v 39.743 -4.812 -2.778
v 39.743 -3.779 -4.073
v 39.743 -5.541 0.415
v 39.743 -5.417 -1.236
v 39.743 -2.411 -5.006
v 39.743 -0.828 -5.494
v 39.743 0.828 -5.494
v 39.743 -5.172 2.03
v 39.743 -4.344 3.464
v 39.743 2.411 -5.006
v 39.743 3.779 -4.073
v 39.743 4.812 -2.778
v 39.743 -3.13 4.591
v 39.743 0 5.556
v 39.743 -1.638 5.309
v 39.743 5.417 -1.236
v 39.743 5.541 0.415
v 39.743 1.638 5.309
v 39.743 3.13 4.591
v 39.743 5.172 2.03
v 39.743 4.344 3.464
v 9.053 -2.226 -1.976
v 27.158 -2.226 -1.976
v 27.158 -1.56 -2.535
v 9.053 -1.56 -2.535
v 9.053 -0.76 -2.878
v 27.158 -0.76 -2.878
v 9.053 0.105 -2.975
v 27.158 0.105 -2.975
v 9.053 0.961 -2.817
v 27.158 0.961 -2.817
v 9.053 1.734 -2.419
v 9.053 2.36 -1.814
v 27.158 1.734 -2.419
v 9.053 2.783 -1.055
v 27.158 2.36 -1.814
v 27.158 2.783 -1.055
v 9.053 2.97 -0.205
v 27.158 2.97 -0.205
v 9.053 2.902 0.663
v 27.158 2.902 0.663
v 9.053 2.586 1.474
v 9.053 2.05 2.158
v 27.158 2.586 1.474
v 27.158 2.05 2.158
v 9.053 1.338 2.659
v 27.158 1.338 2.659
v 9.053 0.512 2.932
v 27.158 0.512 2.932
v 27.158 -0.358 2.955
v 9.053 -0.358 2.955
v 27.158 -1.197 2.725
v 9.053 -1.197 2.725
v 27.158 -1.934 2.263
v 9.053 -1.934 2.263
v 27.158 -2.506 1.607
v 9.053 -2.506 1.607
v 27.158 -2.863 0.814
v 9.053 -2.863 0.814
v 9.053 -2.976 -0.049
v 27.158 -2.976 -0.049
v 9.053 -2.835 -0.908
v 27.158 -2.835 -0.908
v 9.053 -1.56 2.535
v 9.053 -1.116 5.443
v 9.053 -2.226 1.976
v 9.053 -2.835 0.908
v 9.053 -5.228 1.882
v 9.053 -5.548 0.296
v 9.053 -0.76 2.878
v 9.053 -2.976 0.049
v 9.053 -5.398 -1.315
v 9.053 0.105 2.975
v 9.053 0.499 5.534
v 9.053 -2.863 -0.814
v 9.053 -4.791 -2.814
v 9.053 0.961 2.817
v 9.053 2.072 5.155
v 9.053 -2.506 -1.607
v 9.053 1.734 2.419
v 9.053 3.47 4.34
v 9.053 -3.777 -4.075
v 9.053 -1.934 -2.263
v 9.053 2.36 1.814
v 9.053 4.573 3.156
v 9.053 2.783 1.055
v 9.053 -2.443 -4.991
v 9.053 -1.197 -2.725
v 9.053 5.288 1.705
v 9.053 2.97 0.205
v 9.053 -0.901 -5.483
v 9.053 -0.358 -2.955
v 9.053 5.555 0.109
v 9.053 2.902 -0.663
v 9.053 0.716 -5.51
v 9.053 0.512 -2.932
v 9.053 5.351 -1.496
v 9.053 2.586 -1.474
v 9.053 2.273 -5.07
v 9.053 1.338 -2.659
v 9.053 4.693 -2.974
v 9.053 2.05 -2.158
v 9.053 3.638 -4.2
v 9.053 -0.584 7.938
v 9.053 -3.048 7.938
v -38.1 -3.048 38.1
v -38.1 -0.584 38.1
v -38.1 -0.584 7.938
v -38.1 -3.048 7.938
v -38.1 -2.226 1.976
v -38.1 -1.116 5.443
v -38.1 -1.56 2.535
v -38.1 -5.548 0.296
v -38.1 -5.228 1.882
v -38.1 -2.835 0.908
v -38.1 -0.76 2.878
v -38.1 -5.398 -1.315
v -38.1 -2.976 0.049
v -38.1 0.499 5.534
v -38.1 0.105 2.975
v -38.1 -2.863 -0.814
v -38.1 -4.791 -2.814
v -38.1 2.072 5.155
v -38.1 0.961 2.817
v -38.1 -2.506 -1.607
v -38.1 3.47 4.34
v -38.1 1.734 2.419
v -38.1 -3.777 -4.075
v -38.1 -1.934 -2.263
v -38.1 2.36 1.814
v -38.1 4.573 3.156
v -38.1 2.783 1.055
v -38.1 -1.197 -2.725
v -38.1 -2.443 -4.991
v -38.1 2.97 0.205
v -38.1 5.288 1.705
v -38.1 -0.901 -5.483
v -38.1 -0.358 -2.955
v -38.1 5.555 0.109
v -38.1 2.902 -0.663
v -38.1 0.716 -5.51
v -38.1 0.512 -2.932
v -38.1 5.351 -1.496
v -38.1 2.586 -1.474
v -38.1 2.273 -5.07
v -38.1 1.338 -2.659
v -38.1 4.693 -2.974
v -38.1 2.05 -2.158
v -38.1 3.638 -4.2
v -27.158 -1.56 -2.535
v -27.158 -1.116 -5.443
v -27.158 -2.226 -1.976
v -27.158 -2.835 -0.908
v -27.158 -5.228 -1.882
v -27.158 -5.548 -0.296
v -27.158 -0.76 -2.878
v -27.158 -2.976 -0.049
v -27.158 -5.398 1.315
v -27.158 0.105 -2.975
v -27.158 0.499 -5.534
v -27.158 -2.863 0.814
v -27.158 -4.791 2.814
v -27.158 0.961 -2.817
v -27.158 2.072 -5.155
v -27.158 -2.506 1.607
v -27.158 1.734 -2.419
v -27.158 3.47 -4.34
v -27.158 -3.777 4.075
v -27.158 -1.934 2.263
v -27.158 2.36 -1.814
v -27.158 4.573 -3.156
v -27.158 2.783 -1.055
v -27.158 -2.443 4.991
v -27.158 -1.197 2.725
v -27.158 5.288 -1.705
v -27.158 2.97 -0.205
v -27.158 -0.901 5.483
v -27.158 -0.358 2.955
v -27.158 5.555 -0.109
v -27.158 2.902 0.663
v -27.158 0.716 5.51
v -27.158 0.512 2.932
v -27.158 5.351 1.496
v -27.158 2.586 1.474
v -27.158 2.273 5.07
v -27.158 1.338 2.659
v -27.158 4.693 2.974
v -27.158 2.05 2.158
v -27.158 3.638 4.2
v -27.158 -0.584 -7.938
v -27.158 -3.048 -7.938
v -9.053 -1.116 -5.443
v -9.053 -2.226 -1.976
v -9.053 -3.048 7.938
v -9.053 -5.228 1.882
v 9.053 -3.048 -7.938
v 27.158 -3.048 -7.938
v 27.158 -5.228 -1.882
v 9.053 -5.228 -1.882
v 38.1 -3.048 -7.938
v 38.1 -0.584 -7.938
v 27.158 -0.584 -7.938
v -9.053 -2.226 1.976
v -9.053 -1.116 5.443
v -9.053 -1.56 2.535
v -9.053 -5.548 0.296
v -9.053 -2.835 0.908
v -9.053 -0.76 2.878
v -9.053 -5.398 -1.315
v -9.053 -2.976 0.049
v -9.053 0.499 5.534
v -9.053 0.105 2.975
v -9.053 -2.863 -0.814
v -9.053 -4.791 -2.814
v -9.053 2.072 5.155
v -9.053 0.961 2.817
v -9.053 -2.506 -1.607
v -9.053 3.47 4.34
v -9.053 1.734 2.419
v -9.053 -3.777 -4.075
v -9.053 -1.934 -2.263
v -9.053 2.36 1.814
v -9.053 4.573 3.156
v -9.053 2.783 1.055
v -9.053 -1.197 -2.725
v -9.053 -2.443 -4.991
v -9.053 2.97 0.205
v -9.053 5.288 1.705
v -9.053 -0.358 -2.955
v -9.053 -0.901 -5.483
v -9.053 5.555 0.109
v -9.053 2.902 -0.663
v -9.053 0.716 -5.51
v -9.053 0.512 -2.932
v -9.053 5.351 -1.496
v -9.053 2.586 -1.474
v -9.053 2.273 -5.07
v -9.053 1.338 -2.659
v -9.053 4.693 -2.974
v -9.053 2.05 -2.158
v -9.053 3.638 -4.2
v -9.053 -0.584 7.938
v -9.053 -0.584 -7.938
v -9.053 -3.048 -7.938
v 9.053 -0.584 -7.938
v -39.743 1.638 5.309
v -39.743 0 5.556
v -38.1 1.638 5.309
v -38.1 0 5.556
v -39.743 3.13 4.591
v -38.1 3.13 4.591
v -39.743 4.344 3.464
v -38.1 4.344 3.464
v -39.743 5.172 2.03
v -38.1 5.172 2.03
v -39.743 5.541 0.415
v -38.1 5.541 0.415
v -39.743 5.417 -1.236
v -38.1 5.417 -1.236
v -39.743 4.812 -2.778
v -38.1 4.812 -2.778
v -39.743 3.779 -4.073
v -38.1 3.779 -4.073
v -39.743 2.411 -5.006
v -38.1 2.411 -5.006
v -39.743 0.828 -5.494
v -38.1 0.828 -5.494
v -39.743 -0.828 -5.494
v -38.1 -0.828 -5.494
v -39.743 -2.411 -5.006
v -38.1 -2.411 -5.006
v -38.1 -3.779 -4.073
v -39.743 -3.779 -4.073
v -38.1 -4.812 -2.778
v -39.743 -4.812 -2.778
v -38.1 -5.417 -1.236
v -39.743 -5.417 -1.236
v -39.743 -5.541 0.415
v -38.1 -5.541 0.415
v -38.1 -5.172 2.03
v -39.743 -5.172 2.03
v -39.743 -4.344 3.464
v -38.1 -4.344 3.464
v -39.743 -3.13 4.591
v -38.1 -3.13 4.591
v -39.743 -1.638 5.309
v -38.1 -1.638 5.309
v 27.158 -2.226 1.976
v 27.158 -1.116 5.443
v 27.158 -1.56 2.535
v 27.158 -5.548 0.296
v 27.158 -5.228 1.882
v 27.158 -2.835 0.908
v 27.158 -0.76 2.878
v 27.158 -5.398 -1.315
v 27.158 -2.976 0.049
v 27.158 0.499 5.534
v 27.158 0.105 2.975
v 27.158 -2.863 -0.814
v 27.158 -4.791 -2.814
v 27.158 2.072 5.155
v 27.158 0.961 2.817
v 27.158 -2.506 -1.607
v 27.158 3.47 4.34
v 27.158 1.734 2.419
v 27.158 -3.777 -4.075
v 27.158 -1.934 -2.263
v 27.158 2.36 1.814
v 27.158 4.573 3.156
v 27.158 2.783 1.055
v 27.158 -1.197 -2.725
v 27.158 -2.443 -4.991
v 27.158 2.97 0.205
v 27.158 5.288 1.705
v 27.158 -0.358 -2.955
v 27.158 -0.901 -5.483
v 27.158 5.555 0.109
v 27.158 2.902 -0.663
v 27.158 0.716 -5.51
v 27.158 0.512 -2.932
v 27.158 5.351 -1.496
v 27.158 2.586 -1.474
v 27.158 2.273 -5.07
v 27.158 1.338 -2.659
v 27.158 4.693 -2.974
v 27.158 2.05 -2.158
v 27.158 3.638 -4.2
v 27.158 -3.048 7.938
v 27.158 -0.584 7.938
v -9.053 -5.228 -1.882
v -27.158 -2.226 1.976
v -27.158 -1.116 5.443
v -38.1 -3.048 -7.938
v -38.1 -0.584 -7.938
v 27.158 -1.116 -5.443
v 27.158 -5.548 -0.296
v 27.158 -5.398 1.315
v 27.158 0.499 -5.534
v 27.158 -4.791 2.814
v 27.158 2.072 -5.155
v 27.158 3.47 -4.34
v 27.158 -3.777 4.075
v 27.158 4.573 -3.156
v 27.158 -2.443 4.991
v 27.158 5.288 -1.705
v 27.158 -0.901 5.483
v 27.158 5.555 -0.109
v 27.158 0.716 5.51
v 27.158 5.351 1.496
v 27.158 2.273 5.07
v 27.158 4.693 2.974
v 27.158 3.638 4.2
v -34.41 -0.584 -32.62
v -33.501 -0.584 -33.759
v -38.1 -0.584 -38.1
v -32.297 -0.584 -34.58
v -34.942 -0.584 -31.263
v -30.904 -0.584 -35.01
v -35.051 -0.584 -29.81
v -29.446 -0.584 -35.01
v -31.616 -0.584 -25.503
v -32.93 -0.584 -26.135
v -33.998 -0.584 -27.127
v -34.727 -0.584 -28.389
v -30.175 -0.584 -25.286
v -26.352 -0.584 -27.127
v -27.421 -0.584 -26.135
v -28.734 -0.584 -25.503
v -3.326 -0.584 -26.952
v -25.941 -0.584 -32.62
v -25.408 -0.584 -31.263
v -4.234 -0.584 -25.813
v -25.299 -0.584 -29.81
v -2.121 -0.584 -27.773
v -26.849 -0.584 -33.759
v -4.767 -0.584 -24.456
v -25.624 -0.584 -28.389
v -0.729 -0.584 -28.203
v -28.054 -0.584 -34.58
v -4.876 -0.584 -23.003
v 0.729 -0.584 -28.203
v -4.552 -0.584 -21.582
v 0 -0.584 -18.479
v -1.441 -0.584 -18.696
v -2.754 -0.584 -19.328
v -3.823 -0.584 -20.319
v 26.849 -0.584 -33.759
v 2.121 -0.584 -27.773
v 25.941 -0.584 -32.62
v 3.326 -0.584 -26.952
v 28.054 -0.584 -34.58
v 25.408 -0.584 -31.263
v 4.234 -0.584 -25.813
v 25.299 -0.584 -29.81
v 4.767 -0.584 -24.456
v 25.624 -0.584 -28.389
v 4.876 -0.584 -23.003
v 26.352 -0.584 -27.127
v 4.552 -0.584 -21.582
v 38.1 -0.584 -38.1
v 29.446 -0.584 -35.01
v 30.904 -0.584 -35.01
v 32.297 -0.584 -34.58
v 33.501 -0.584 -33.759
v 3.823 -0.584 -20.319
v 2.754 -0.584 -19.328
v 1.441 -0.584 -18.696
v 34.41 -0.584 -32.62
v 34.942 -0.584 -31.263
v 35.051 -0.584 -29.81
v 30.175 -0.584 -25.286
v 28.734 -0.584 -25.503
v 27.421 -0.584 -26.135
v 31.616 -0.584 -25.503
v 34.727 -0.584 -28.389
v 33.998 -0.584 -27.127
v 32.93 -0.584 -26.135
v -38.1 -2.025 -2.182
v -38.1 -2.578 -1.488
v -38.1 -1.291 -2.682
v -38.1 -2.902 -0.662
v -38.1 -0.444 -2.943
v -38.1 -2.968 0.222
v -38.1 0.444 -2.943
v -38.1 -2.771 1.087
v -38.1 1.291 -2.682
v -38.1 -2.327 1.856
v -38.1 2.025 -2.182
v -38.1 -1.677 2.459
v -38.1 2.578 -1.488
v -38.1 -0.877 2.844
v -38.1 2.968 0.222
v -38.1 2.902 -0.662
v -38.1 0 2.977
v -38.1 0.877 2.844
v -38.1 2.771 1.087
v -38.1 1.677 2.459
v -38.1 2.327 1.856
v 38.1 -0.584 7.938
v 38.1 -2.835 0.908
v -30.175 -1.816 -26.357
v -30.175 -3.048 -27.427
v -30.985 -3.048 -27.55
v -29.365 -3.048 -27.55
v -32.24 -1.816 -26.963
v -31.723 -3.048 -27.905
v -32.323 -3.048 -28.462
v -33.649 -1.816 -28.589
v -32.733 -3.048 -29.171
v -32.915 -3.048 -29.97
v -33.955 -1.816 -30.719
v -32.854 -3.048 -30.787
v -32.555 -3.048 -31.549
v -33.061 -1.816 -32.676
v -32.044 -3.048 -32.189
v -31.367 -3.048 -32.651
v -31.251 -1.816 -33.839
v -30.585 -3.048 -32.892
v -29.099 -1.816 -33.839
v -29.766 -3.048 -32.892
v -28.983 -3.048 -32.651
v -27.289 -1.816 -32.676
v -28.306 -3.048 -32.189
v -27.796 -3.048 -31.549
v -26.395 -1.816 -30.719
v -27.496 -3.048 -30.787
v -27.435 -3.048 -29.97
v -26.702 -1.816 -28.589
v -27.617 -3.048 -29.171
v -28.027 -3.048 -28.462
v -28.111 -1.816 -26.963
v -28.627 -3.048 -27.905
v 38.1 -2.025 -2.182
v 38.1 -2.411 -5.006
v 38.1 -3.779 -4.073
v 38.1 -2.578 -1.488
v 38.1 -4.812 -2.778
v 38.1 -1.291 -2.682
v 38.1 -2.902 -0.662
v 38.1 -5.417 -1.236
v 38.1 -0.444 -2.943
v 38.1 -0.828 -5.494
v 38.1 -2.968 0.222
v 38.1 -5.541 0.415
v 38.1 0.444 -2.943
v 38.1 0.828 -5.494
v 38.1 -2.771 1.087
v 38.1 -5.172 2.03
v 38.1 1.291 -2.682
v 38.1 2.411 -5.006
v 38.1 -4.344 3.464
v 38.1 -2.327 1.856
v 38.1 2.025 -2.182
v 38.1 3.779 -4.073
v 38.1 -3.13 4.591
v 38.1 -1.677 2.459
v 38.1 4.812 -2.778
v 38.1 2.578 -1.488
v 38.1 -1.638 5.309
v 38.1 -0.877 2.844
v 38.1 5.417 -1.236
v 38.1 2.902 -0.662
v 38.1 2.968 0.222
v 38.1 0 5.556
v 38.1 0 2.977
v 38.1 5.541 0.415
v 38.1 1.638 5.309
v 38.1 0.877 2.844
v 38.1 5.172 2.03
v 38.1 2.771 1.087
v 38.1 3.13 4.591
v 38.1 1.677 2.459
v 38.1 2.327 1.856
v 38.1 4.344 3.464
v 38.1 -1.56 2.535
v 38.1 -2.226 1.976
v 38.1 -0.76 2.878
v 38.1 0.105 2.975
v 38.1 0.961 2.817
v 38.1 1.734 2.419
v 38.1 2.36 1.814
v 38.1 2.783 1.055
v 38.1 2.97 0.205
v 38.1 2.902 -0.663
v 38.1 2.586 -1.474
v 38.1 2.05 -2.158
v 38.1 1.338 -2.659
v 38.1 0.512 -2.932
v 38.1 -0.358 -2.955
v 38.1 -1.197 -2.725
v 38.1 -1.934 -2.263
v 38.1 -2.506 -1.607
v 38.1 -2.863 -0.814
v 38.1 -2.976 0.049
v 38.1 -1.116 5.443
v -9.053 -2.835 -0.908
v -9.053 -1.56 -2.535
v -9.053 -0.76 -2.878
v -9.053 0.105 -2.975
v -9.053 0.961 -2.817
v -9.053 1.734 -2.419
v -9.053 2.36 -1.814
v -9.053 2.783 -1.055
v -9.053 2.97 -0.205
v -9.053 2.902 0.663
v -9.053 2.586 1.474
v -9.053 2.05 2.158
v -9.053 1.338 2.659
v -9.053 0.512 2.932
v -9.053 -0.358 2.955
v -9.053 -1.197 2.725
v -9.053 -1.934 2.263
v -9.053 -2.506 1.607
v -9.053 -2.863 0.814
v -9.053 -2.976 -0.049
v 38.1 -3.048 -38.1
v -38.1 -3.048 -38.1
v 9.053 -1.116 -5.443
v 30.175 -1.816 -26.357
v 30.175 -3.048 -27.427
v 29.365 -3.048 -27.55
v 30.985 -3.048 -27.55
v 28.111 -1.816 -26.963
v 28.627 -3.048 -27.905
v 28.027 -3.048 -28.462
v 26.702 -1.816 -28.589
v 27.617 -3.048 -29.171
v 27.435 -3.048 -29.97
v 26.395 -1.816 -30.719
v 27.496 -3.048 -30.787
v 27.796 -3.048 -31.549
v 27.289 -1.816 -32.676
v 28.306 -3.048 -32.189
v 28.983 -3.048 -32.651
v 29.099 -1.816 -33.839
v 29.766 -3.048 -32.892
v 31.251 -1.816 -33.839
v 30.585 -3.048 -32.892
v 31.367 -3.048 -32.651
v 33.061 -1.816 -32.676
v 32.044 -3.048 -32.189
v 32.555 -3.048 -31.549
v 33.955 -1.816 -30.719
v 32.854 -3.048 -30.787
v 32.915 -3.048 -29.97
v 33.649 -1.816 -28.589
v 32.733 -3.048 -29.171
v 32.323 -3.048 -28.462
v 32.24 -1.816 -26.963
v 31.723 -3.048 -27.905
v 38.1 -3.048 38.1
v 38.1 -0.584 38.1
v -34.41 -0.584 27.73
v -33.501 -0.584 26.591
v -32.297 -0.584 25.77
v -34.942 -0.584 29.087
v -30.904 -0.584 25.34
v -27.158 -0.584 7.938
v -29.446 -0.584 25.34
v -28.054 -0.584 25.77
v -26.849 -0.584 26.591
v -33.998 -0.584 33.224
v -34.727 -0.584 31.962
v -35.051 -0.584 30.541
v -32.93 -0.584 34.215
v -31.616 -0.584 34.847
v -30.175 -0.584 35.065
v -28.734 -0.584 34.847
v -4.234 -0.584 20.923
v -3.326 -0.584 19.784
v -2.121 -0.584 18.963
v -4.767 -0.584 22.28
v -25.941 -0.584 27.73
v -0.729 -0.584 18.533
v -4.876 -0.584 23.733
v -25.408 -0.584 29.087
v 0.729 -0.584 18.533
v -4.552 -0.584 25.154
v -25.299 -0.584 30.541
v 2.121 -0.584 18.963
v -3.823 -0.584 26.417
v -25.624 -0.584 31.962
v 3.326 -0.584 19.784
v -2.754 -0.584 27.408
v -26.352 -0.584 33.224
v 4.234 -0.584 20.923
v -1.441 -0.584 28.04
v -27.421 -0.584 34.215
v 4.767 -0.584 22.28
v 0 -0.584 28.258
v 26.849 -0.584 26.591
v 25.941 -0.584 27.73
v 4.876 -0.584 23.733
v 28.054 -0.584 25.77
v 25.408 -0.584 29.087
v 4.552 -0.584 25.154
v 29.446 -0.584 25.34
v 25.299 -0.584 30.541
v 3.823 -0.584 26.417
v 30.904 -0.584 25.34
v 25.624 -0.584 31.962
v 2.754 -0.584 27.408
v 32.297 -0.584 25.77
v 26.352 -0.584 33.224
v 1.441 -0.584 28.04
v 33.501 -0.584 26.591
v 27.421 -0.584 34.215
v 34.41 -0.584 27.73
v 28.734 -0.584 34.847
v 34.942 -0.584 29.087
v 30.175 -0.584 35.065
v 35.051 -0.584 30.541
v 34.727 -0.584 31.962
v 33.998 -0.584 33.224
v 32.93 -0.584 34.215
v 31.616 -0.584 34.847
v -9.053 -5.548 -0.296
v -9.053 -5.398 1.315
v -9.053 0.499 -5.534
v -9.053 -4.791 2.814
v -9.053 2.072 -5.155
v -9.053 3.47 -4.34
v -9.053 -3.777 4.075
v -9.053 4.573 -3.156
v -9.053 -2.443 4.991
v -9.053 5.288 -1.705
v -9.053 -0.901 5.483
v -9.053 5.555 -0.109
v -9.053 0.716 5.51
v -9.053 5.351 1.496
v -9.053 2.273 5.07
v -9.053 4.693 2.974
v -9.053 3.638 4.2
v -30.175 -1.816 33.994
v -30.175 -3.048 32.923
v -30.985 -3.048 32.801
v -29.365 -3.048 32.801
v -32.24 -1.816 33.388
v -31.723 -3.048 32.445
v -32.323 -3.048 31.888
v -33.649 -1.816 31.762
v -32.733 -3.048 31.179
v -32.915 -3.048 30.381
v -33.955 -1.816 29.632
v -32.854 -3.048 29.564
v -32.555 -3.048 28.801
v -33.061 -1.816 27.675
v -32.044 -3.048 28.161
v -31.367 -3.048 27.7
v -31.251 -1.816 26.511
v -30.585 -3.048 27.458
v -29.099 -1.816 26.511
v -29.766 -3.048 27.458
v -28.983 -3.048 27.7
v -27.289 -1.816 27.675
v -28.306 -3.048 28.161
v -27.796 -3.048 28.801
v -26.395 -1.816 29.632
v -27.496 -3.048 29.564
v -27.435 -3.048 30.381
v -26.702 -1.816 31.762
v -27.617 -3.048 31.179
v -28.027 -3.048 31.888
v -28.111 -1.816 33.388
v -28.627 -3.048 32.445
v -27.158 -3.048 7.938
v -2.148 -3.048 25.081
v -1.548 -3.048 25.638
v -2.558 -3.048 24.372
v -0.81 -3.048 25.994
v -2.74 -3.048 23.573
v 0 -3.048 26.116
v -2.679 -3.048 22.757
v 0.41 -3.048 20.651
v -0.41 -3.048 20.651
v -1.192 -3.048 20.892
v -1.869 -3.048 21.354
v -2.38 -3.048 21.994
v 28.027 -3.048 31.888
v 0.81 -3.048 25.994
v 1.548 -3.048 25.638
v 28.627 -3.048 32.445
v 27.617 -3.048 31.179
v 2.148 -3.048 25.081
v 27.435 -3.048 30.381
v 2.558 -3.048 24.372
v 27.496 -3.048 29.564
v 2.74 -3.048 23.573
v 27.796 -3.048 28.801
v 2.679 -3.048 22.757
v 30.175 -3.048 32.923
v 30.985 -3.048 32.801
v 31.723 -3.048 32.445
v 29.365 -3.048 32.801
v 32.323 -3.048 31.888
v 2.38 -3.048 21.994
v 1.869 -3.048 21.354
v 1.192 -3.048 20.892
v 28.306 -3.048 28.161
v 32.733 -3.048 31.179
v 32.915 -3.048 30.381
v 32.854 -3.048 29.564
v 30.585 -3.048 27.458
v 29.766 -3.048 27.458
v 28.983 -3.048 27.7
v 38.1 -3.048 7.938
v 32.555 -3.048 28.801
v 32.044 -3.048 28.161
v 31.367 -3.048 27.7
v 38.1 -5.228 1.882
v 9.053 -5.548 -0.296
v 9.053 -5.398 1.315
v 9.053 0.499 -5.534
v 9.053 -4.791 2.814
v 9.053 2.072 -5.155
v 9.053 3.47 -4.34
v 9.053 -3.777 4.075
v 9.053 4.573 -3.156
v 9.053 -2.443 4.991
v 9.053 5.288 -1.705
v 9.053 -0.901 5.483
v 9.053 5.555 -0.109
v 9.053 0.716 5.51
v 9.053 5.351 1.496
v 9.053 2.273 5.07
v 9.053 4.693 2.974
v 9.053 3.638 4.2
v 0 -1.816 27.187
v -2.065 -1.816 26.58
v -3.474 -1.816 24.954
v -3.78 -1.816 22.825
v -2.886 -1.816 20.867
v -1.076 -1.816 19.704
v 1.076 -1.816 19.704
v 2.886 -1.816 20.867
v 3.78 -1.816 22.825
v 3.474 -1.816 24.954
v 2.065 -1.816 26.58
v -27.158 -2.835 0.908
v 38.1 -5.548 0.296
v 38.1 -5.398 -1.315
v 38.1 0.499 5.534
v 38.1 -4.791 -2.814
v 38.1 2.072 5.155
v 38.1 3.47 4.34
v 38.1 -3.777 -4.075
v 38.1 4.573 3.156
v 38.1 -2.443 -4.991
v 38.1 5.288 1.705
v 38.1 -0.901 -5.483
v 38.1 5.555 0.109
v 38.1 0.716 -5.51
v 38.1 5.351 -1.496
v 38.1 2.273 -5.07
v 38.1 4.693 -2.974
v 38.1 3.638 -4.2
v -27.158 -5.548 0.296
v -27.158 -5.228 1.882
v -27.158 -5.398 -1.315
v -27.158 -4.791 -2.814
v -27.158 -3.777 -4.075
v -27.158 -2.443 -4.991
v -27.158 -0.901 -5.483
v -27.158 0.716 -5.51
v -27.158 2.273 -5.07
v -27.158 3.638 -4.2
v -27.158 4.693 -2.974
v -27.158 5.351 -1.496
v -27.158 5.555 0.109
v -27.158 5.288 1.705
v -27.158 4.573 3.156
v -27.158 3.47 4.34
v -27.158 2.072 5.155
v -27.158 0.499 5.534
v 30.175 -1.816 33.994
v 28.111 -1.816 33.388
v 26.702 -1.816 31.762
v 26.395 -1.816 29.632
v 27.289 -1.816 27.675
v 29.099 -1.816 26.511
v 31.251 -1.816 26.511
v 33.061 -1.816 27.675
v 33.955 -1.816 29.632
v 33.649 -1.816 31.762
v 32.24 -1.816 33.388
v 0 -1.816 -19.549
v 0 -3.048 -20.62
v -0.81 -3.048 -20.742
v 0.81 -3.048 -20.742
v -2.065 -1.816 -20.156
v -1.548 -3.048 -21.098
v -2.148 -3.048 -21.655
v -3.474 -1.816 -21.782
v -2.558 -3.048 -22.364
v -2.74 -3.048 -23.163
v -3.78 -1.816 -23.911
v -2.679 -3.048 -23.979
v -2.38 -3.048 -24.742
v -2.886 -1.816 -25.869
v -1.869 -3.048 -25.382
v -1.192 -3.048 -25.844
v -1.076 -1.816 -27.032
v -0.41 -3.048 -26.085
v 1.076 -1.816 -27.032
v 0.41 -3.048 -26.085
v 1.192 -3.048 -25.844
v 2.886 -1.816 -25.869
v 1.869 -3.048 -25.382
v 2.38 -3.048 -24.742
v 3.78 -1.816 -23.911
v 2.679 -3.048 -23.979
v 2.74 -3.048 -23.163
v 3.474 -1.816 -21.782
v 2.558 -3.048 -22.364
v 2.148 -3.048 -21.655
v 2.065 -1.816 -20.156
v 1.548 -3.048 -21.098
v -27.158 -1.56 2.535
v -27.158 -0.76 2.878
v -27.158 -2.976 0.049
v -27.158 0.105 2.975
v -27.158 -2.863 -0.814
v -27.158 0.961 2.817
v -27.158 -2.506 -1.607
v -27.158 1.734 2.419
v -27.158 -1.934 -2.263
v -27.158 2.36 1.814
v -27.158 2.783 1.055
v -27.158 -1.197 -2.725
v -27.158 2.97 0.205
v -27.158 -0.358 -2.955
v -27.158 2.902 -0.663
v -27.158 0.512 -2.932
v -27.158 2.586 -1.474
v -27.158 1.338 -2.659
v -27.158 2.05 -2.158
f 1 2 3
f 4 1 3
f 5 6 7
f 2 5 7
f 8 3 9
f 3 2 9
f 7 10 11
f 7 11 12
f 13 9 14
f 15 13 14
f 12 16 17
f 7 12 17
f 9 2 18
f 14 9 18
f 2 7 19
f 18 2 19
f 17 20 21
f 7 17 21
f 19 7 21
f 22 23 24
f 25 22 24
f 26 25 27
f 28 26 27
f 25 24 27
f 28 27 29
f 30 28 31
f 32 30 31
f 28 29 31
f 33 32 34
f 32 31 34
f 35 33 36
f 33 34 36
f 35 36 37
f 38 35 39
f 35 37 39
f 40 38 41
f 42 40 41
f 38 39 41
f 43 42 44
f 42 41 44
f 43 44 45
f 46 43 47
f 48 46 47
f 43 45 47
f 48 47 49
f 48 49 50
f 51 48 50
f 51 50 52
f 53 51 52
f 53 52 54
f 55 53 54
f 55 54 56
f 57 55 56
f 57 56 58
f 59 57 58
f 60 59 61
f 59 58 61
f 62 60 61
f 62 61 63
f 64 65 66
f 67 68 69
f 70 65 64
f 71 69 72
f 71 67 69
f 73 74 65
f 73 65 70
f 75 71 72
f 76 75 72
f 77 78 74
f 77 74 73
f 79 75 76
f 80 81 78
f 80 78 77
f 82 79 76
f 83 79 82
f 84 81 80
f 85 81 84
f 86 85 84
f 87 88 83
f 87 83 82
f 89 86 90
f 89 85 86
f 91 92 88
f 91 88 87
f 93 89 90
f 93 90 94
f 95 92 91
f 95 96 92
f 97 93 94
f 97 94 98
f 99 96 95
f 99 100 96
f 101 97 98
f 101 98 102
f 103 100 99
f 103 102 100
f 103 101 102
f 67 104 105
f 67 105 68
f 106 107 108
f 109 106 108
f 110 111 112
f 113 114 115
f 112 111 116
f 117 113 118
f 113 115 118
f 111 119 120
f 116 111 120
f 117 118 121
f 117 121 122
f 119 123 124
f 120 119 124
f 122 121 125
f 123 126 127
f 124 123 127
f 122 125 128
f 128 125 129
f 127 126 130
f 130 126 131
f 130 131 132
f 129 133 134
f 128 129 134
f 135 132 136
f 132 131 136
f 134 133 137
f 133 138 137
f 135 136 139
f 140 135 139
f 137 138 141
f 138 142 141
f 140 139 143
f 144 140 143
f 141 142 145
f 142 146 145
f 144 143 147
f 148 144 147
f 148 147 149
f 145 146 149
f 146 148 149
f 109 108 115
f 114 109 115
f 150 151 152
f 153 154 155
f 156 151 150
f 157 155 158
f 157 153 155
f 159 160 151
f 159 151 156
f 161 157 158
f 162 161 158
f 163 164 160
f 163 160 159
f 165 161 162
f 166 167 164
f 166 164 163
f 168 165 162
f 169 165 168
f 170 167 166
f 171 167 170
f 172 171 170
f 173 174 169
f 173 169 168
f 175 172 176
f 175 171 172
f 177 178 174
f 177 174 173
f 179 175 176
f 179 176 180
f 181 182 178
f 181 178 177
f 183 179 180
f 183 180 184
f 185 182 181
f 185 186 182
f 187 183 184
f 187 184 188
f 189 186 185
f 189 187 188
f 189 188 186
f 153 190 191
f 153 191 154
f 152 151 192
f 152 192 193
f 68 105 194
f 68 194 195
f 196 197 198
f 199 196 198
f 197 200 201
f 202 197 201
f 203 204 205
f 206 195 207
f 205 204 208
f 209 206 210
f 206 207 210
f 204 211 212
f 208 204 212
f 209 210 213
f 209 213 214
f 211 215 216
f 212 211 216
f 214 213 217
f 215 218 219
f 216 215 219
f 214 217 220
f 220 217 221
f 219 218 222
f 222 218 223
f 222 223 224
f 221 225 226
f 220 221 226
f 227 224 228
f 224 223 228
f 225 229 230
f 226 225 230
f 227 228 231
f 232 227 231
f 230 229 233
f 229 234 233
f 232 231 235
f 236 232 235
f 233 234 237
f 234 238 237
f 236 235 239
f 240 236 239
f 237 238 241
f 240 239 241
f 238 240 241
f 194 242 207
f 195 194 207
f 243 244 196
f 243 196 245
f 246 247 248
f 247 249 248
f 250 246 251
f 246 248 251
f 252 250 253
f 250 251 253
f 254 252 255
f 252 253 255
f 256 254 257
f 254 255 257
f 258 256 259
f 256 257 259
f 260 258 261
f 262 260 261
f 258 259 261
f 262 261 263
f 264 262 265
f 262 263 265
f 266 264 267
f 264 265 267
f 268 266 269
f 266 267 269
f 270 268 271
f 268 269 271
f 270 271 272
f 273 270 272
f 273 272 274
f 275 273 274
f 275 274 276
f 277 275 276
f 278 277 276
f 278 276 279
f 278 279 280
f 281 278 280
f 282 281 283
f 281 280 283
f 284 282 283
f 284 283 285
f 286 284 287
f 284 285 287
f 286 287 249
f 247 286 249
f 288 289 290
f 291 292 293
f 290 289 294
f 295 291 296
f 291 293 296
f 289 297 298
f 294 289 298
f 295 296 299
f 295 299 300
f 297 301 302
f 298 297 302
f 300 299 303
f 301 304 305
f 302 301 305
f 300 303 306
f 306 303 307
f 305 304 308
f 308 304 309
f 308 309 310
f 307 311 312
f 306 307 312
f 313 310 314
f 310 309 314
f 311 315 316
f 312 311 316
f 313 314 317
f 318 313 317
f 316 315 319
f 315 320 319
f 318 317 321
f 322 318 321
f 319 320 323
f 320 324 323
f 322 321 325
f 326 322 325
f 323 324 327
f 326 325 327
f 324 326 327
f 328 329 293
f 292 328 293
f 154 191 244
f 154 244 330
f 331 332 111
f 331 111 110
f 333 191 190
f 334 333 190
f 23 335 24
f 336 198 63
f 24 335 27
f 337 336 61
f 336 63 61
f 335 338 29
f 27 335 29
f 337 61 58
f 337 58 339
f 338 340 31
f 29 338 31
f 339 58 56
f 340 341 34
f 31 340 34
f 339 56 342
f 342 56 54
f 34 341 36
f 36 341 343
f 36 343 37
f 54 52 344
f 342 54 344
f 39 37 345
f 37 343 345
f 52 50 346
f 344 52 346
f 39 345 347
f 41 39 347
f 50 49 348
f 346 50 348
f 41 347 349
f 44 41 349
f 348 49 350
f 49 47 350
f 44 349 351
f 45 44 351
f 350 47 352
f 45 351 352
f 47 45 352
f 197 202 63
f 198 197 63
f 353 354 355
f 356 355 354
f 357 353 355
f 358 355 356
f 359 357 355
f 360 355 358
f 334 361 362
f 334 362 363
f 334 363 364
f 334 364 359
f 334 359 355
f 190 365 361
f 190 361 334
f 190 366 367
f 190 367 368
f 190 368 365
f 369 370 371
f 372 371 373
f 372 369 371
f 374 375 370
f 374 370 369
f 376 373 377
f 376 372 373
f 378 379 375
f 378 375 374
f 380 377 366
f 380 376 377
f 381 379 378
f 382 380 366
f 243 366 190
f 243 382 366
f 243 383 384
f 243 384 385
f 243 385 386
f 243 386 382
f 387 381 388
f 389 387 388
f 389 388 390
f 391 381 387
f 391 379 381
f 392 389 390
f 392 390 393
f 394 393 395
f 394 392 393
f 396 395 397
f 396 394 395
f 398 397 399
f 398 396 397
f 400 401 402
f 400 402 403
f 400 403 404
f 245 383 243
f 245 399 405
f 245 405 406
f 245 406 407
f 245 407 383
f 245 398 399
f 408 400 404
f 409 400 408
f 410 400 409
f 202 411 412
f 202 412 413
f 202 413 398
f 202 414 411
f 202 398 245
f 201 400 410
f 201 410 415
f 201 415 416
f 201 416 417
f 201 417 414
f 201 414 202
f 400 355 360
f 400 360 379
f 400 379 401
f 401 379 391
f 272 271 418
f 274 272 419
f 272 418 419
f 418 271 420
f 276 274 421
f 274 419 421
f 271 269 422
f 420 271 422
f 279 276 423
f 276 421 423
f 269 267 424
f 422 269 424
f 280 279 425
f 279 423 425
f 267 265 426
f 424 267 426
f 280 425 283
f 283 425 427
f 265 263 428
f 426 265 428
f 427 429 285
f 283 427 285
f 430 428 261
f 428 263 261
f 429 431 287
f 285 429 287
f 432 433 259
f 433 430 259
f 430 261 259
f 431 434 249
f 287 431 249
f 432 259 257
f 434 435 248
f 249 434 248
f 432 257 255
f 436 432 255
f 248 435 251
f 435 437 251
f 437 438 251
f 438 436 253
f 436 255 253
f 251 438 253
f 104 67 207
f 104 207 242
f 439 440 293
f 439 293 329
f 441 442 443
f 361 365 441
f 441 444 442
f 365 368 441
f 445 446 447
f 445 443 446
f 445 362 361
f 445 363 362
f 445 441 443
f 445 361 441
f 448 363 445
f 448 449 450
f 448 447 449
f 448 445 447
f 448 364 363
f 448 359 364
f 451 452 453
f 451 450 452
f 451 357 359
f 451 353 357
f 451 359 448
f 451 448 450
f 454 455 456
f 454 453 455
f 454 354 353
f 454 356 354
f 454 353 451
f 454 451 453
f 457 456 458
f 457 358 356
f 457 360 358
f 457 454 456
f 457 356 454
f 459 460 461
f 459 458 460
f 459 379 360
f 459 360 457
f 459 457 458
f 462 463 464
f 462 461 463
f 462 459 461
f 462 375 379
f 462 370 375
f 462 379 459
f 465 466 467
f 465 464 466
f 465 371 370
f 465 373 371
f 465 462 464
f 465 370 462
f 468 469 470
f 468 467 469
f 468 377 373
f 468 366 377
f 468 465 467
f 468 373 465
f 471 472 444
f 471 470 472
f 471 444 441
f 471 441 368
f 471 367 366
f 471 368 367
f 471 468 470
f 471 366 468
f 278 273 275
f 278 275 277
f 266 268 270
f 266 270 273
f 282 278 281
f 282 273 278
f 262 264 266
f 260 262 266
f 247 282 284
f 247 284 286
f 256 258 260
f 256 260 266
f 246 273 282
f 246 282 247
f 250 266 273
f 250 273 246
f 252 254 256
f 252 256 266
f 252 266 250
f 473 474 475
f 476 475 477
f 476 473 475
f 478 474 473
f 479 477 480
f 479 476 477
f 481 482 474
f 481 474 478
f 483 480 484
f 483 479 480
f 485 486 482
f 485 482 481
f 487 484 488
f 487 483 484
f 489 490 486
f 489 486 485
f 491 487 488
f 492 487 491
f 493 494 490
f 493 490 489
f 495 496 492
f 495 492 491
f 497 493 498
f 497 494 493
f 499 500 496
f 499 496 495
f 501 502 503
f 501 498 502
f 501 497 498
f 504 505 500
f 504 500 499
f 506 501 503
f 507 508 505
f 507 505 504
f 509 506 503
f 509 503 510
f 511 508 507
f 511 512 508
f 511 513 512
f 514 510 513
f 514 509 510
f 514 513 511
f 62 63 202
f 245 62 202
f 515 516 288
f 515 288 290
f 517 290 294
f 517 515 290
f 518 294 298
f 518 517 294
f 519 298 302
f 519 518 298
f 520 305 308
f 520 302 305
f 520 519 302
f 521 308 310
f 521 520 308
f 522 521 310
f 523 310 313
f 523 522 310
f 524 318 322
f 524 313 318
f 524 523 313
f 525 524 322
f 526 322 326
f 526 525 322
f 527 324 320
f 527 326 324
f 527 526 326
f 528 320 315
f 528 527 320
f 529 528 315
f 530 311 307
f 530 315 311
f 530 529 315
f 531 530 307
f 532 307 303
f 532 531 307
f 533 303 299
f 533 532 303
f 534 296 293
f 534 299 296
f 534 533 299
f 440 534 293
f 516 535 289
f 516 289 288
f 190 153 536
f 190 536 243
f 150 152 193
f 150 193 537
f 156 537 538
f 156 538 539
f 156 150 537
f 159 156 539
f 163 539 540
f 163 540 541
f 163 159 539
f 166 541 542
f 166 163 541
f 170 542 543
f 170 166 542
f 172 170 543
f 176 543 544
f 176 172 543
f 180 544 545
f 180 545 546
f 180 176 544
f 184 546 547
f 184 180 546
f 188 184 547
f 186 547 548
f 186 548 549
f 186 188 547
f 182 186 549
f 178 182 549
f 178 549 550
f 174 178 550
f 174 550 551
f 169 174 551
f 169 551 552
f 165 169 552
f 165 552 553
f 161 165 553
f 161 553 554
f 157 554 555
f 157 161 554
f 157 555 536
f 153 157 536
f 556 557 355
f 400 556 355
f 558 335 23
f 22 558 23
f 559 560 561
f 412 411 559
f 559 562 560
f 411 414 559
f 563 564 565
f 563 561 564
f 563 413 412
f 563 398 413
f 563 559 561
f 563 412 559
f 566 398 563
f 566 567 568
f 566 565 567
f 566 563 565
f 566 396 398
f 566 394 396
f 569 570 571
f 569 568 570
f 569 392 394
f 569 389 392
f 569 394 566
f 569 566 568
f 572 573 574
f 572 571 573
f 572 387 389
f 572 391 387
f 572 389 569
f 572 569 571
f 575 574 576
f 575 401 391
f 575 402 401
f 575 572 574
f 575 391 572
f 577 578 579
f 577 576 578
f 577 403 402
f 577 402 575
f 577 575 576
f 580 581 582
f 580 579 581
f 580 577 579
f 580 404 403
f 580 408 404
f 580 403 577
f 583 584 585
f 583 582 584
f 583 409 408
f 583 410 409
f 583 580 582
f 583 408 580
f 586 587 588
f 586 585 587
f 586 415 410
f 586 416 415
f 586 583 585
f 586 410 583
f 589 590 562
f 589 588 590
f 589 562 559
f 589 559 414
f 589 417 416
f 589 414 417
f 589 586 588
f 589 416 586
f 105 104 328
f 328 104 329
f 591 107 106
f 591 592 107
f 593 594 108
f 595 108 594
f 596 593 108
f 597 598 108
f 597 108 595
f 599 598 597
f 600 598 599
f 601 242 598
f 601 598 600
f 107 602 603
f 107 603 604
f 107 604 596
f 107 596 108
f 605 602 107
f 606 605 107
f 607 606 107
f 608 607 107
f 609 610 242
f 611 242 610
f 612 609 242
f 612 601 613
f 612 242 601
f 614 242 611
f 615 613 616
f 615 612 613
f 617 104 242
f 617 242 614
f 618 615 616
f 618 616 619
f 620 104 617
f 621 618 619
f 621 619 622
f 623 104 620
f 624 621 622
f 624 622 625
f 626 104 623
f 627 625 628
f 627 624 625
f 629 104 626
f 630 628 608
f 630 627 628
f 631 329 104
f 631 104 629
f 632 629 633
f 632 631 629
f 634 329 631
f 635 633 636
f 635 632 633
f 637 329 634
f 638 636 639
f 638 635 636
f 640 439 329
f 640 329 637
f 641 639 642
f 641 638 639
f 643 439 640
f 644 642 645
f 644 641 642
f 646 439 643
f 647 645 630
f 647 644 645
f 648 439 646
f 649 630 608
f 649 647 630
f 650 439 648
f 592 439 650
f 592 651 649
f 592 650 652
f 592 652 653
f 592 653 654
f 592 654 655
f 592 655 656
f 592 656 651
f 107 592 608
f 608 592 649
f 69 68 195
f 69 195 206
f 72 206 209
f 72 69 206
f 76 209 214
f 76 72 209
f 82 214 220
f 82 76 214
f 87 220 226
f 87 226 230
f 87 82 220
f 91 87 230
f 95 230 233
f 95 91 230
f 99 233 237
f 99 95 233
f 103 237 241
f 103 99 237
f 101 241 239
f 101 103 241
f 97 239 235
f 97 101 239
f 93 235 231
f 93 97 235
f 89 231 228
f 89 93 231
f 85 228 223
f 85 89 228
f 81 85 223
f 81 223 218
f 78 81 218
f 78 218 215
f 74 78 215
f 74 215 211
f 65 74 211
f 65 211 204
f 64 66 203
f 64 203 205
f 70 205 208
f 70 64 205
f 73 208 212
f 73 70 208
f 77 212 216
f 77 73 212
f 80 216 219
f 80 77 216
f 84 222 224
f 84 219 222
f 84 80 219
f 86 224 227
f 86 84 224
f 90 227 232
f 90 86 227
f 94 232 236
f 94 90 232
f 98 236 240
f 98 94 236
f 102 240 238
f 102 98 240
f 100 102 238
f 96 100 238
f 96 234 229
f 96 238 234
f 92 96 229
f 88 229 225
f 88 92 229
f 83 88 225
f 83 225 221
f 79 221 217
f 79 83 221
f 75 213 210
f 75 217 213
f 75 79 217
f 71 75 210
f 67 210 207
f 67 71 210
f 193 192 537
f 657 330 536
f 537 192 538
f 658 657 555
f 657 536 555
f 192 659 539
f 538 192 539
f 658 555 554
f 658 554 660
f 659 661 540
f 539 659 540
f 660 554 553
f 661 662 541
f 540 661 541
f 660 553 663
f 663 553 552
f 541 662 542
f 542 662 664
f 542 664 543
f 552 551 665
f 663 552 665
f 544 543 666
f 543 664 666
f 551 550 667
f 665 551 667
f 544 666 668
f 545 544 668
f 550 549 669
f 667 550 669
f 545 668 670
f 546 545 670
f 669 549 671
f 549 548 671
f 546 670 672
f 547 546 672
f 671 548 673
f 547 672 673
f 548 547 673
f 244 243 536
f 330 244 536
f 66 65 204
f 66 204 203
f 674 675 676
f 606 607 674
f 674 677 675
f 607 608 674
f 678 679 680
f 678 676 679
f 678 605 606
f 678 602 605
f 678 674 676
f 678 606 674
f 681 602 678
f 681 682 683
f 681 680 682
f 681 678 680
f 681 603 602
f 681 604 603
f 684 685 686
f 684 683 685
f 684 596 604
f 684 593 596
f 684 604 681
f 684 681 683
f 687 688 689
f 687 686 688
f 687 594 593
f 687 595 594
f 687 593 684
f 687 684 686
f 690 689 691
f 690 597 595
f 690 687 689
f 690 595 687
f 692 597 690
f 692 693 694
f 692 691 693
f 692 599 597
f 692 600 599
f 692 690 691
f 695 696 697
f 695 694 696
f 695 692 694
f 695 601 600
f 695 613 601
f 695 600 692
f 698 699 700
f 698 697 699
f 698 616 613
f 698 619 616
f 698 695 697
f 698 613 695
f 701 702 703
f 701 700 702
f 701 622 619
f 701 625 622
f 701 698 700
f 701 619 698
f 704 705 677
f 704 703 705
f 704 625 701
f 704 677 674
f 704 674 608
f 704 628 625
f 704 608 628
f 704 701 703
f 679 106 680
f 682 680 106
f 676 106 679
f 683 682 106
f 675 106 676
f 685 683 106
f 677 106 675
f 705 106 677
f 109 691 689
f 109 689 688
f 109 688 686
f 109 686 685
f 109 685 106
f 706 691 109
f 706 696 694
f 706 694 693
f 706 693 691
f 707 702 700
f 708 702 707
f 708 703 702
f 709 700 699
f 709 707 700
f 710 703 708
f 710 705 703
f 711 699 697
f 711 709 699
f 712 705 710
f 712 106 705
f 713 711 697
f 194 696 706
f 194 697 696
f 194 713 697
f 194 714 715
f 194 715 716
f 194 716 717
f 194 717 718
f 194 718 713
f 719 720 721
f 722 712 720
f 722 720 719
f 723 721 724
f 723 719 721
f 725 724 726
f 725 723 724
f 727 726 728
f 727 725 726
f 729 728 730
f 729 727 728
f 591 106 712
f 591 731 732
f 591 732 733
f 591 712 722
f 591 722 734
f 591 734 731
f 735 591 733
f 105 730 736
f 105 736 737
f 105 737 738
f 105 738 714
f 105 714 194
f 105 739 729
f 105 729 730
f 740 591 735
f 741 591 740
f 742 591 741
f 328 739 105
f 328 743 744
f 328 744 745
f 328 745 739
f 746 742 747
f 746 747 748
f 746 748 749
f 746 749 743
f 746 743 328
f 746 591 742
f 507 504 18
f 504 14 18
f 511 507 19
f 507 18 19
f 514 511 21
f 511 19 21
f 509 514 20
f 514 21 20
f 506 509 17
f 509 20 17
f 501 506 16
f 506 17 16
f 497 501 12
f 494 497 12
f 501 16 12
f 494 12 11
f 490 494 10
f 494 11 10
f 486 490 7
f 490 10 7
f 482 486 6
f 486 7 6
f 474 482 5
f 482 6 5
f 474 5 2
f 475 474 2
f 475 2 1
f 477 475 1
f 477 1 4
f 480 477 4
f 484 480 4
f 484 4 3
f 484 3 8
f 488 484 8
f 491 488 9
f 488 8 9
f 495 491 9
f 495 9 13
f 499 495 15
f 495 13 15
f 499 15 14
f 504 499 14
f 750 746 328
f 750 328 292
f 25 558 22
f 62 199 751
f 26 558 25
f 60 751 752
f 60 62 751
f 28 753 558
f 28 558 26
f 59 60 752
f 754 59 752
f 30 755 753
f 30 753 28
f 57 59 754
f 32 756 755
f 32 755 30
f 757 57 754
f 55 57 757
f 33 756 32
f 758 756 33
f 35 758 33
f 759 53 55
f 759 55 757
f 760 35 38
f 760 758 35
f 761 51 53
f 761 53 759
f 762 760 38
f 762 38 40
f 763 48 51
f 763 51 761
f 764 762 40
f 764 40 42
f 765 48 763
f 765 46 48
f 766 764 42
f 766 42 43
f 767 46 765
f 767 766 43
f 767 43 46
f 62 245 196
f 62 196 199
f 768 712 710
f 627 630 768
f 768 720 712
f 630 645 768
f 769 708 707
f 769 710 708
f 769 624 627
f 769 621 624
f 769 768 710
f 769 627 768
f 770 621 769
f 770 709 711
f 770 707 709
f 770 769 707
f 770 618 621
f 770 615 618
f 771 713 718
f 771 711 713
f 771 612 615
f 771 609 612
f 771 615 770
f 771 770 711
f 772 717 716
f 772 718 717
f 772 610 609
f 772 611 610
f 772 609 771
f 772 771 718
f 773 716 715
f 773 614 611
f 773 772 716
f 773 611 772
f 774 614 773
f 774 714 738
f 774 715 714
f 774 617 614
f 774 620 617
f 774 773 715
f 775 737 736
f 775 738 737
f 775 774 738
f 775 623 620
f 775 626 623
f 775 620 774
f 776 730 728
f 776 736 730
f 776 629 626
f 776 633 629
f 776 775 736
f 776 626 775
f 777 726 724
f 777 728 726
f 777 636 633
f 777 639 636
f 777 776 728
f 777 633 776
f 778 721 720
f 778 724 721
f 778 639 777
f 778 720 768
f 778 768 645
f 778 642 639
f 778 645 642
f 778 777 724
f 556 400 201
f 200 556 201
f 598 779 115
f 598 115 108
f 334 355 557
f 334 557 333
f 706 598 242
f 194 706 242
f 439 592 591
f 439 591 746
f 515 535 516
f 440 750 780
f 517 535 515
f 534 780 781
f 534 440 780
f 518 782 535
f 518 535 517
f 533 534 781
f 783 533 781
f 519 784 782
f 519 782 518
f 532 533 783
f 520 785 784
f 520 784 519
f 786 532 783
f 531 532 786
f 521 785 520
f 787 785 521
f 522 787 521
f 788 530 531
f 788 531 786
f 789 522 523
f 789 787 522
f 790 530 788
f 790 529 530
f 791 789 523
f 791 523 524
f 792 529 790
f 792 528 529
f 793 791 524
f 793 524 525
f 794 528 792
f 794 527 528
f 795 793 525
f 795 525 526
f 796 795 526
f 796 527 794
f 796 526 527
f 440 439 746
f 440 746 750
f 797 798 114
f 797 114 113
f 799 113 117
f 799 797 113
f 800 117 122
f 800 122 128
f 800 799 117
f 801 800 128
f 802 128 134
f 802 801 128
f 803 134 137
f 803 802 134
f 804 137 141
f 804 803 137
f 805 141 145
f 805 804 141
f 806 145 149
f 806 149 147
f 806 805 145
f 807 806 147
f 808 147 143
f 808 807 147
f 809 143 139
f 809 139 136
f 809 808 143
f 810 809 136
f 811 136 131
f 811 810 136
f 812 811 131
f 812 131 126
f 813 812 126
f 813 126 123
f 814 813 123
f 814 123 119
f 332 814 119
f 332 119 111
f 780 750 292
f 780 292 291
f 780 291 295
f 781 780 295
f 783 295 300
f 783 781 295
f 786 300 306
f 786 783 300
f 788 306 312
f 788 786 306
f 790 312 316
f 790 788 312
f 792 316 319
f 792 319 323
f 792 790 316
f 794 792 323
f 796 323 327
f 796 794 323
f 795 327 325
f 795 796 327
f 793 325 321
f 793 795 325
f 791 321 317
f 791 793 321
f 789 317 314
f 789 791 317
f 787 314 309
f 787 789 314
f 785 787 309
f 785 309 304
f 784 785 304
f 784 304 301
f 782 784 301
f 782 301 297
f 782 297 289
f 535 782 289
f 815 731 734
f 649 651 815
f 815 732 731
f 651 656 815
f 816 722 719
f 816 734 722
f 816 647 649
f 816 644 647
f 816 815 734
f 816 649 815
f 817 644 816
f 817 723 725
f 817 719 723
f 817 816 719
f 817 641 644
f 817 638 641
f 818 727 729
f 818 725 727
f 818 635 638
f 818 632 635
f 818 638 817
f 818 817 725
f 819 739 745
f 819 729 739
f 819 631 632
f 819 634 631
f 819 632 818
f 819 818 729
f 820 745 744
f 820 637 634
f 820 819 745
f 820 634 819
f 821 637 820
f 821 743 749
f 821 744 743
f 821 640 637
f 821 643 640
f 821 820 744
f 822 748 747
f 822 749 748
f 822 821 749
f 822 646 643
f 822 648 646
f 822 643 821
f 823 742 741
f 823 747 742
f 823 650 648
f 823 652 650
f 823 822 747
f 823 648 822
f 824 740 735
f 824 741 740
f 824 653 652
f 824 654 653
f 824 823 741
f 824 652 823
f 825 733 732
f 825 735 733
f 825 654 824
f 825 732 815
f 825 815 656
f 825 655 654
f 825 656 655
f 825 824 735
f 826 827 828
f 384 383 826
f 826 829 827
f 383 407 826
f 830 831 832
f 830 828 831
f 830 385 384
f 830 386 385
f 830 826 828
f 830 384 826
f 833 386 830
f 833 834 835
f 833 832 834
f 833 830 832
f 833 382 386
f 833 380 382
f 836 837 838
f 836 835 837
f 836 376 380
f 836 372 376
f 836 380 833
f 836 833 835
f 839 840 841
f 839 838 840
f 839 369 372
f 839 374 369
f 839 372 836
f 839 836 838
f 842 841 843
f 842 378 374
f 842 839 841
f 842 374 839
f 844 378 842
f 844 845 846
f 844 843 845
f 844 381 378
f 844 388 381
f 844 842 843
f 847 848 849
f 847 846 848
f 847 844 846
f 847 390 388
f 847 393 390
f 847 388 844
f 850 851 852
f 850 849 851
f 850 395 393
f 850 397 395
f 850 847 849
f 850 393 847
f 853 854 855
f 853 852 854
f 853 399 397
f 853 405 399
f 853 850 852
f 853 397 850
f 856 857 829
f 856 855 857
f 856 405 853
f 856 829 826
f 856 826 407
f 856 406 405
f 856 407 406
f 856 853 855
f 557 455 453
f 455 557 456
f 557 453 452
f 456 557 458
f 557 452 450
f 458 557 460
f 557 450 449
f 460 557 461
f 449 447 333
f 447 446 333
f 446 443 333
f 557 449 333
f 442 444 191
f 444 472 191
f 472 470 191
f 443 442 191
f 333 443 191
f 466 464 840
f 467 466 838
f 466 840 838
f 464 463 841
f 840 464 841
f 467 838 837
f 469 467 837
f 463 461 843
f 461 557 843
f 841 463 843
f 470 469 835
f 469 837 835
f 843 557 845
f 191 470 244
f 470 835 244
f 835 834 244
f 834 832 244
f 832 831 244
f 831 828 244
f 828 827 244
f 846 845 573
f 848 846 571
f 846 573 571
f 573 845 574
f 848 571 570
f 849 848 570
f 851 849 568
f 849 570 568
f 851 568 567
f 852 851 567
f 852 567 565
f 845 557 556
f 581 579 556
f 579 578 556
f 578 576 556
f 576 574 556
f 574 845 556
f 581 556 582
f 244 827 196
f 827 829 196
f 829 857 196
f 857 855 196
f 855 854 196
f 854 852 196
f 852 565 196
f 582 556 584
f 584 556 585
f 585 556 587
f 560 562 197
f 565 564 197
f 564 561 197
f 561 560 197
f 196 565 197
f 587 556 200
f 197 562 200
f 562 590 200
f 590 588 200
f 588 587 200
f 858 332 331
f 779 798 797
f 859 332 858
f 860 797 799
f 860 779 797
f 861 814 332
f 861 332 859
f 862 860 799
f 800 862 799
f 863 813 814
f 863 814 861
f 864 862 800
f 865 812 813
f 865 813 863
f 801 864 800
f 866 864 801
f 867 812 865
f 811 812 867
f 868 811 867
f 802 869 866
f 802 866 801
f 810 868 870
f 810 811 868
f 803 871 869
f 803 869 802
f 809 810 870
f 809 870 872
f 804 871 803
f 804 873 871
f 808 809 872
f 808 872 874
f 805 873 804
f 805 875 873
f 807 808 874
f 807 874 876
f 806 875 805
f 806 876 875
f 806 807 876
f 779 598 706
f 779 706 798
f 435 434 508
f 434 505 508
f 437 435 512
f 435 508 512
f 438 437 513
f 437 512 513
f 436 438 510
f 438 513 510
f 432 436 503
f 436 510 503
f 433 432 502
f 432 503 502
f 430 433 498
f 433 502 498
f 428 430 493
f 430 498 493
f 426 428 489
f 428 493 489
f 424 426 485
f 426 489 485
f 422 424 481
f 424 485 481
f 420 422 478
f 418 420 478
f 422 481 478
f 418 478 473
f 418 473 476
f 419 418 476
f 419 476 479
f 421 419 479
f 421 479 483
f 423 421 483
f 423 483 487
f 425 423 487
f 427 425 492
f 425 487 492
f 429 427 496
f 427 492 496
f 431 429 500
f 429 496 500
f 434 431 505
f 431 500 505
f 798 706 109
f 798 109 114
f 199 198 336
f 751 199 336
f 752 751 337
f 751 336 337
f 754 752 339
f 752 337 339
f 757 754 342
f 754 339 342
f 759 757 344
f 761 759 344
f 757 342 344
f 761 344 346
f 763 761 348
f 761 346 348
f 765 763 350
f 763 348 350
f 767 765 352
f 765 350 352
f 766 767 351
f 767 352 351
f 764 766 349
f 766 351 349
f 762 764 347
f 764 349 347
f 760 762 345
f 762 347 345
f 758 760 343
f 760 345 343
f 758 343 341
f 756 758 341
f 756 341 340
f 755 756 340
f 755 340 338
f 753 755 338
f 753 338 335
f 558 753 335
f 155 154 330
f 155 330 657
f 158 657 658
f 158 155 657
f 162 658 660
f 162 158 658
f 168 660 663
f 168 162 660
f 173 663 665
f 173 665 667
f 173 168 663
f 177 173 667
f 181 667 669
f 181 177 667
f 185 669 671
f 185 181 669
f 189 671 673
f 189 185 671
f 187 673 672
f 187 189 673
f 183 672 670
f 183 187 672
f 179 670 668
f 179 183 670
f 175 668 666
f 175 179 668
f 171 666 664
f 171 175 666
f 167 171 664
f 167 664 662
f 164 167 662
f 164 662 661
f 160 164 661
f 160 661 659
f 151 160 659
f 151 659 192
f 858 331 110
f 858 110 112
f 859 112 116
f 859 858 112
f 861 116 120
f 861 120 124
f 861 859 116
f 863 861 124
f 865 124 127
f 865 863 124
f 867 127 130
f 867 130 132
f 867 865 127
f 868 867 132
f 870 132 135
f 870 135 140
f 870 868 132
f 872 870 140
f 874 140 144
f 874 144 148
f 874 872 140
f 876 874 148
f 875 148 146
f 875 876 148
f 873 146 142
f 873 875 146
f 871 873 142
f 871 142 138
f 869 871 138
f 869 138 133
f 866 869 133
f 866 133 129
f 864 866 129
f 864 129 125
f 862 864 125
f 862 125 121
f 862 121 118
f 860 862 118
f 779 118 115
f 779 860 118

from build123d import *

# Parameters (mm, degrees)
LEFT_LEAF_DEPTH                              = 38.1
SKETCH2_W                                    = 18.10512
SKETCH2_H                                    = 13.49375
CUT_EXTRUDE1_DEPTH                           = 6.55625
CUT_EXTRUDE1_DEPTH_BACK                      = 6.55625
RIGHT_LEAF_DEPTH                             = 18.10512
EXTRUDE3_START                               = -38.1
SKETCH4_W                                    = 30.1625
SKETCH4_H                                    = 2.4638
EXTRUDE3_DEPTH                               = 76.2
SKETCH6_W                                    = 76.2
SKETCH6_H                                    = 2.9765625
SKETCH7_W                                    = 1.642533333
SKETCH7_H                                    = 5.55625
CSK_FOR_10_FLAT_HEAD_MACHINE_SCREW1_AT_COUNT = 2
CSK_FOR_10_FLAT_HEAD_MACHINE_SCREW1_AT_PITCH = 60.3504
CSK_FOR_10_FLAT_HEAD_MACHINE_SCREW1_2_COUNT  = 2
CSK_FOR_10_FLAT_HEAD_MACHINE_SCREW1_2_PITCH  = 85.348354175
CSK_FOR_10_FLAT_HEAD_MACHINE_SCREW1_3_COUNT  = 2
CSK_FOR_10_FLAT_HEAD_MACHINE_SCREW1_3_PITCH  = 60.3504
CSK_FOR_10_FLAT_HEAD_MACHINE_SCREW1_4_COUNT  = 2
CSK_FOR_10_FLAT_HEAD_MACHINE_SCREW1_4_PITCH  = 61.460694442
CSK_FOR_10_FLAT_HEAD_MACHINE_SCREW1_5_COUNT  = 2
CSK_FOR_10_FLAT_HEAD_MACHINE_SCREW1_5_PITCH  = 30.93348779


with BuildPart() as part:
    # Sketch1 → Left Leaf (new body, symmetric)
    with BuildSketch(Plane(origin=(0, 0, 0), x_dir=(0, 0, -1), z_dir=(1, 0, 0))):
        with BuildLine():
            Line((-7.9375, -3.048), (-1.881879584, -5.227852647))
            ThreePointArc((-1.881879584, -5.227852647), (4.20000577, 3.637563139), (-5.442995818, -1.116114057))
            Line((-5.442995818, -1.116114057), (-1.975984457, -2.226074963))
            ThreePointArc((-1.975984457, -2.226074963), (1.473554552, 2.586225299), (-0.907567655, -2.834827202))
            Line((-0.907567655, -2.834827202), (-7.9375, -0.5842))
            Line((-7.9375, -0.5842), (-38.1, -0.5842))
            Line((-38.1, -0.5842), (-38.1, -3.048))
            Line((-38.1, -3.048), (-7.9375, -3.048))
        make_face()
    extrude(amount=LEFT_LEAF_DEPTH, both=True)

    # Sketch2 → Cut-Extrude1 (cut, two sides)
    with BuildSketch(Plane(origin=(0, 0, 0), x_dir=(1, 0, 0), z_dir=(0, 1, 0))) as cut_extrude1_sk:
        with Locations((18.10512, -1.190625)):
            Rectangle(SKETCH2_W, SKETCH2_H)
        with Locations((-18.10512, -1.190625)):
            Rectangle(SKETCH2_W, SKETCH2_H)
    extrude(amount=CUT_EXTRUDE1_DEPTH, mode=Mode.SUBTRACT)
    extrude(cut_extrude1_sk.sketch, amount=-CUT_EXTRUDE1_DEPTH_BACK, mode=Mode.SUBTRACT)

    # Sketch9 → CSK for #10 Flat Head Machine Screw1 (revolve, cut)
    with BuildSketch(Plane(origin=(-30.1752, -0.5842, 30.1752), x_dir=(0, 0, 1), z_dir=(1, 0, 0))):
        Polygon((0, 0), (0, 4.97205), (2.5527, 4.97205), (2.5527, 2.688180894), (4.8895, 0), align=None)
    csk_for_10_flat_head_machine_screw1 = revolve(axis=Axis((-30.1752, 5.7658, 30.1752), (0, -1, 0)), mode=Mode.SUBTRACT)

    # CSK for _10 Flat Head Machine Screw1 3: CSK for #10 Flat Head Machine Screw1 ×2
    with Locations(*[(i * CSK_FOR_10_FLAT_HEAD_MACHINE_SCREW1_3_PITCH, 0, 0) for i in range(1, CSK_FOR_10_FLAT_HEAD_MACHINE_SCREW1_3_COUNT)]):
        add(csk_for_10_flat_head_machine_screw1, mode=Mode.SUBTRACT)

    # CSK for _10 Flat Head Machine Screw1 5: CSK for #10 Flat Head Machine Screw1 ×2
    with Locations(*[Vector(0.975486508, 0, -0.220059246) * (i * CSK_FOR_10_FLAT_HEAD_MACHINE_SCREW1_5_PITCH) for i in range(1, CSK_FOR_10_FLAT_HEAD_MACHINE_SCREW1_5_COUNT)]):
        add(csk_for_10_flat_head_machine_screw1, mode=Mode.SUBTRACT)


with BuildPart() as body_2:
    # Sketch3 → Right Leaf (new body)
    with BuildSketch(Plane(origin=(27.15768, 0, 0), x_dir=(0, 0, -1), z_dir=(1, 0, 0))):
        with BuildLine():
            Line((7.9375, -3.048), (1.881879584, -5.227852647))
            ThreePointArc((1.881879584, -5.227852647), (-4.20000577, 3.637563139), (5.442995818, -1.116114057))
            Line((5.442995818, -1.116114057), (1.975984457, -2.226074963))
            ThreePointArc((1.975984457, -2.226074963), (-1.473554552, 2.586225299), (0.907567655, -2.834827202))
            Line((0.907567655, -2.834827202), (7.9375, -0.5842))
            Line((7.9375, -0.5842), (38.1, -0.5842))
            Line((38.1, -0.5842), (38.1, -3.048))
            Line((38.1, -3.048), (7.9375, -3.048))
        make_face()
    extrude(amount=-RIGHT_LEAF_DEPTH)


with BuildPart() as body_3:
    # Mirror1: mirrored copy
    add(body_2.part.mirror(Plane(origin=(0, 0, 0), x_dir=(0, 0, 1), z_dir=(1, 0, 0))))


with BuildPart() as body_4:
    # Sketch4 → Extrude3 (new body)
    with BuildSketch(Plane.ZY.offset(EXTRUDE3_START)):
        with Locations((-23.01875, -1.8161)):
            Rectangle(SKETCH4_W, SKETCH4_H)
    extrude(amount=EXTRUDE3_DEPTH)


with BuildPart() as body_3_1:
    add(body_3.part)

    # Combine1: union body 2, body 4
    add(body_2.part)
    add(body_4.part)

    # CSK for #10 Flat Head Machine Screw1 at: CSK for #10 Flat Head Machine Screw1 ×2
    with Locations(*[(0, 0, -i * CSK_FOR_10_FLAT_HEAD_MACHINE_SCREW1_AT_PITCH) for i in range(1, CSK_FOR_10_FLAT_HEAD_MACHINE_SCREW1_AT_COUNT)]):
        add(csk_for_10_flat_head_machine_screw1, mode=Mode.SUBTRACT)

    # CSK for _10 Flat Head Machine Screw1 2: CSK for #10 Flat Head Machine Screw1 ×2
    with Locations(*[Vector(0.707106781, 0, -0.707106781) * (i * CSK_FOR_10_FLAT_HEAD_MACHINE_SCREW1_2_PITCH) for i in range(1, CSK_FOR_10_FLAT_HEAD_MACHINE_SCREW1_2_COUNT)]):
        add(csk_for_10_flat_head_machine_screw1, mode=Mode.SUBTRACT)

    # CSK for _10 Flat Head Machine Screw1 4: CSK for #10 Flat Head Machine Screw1 ×2
    with Locations(*[Vector(0.490967443, 0, -0.871177921) * (i * CSK_FOR_10_FLAT_HEAD_MACHINE_SCREW1_4_PITCH) for i in range(1, CSK_FOR_10_FLAT_HEAD_MACHINE_SCREW1_4_COUNT)]):
        add(csk_for_10_flat_head_machine_screw1, mode=Mode.SUBTRACT)


with BuildPart() as body_3_2:
    # Sketch6 → Pin (revolve)
    with BuildSketch(Plane(origin=(0, 0, 0), x_dir=(1, 0, 0), z_dir=(0, 1, 0))):
        with Locations((0, -1.48828125)):
            Rectangle(SKETCH6_W, SKETCH6_H)
    revolve(axis=Axis((24.566181471, 0, 0), (-1, 0, 0)))

    # Sketch7 → Spun Pin (revolve)
    with BuildSketch(Plane(origin=(0, 0, 0), x_dir=(1, 0, 0), z_dir=(0, 1, 0))):
        with Locations((-38.921266667, -2.778125)):
            Rectangle(SKETCH7_W, SKETCH7_H)
        with Locations((38.921266667, -2.778125)):
            Rectangle(SKETCH7_W, SKETCH7_H)
    revolve(axis=Axis((24.566181471, 0, 0), (-1, 0, 0)))


solid = Compound([part.part, body_3_1.part, body_3_2.part])
